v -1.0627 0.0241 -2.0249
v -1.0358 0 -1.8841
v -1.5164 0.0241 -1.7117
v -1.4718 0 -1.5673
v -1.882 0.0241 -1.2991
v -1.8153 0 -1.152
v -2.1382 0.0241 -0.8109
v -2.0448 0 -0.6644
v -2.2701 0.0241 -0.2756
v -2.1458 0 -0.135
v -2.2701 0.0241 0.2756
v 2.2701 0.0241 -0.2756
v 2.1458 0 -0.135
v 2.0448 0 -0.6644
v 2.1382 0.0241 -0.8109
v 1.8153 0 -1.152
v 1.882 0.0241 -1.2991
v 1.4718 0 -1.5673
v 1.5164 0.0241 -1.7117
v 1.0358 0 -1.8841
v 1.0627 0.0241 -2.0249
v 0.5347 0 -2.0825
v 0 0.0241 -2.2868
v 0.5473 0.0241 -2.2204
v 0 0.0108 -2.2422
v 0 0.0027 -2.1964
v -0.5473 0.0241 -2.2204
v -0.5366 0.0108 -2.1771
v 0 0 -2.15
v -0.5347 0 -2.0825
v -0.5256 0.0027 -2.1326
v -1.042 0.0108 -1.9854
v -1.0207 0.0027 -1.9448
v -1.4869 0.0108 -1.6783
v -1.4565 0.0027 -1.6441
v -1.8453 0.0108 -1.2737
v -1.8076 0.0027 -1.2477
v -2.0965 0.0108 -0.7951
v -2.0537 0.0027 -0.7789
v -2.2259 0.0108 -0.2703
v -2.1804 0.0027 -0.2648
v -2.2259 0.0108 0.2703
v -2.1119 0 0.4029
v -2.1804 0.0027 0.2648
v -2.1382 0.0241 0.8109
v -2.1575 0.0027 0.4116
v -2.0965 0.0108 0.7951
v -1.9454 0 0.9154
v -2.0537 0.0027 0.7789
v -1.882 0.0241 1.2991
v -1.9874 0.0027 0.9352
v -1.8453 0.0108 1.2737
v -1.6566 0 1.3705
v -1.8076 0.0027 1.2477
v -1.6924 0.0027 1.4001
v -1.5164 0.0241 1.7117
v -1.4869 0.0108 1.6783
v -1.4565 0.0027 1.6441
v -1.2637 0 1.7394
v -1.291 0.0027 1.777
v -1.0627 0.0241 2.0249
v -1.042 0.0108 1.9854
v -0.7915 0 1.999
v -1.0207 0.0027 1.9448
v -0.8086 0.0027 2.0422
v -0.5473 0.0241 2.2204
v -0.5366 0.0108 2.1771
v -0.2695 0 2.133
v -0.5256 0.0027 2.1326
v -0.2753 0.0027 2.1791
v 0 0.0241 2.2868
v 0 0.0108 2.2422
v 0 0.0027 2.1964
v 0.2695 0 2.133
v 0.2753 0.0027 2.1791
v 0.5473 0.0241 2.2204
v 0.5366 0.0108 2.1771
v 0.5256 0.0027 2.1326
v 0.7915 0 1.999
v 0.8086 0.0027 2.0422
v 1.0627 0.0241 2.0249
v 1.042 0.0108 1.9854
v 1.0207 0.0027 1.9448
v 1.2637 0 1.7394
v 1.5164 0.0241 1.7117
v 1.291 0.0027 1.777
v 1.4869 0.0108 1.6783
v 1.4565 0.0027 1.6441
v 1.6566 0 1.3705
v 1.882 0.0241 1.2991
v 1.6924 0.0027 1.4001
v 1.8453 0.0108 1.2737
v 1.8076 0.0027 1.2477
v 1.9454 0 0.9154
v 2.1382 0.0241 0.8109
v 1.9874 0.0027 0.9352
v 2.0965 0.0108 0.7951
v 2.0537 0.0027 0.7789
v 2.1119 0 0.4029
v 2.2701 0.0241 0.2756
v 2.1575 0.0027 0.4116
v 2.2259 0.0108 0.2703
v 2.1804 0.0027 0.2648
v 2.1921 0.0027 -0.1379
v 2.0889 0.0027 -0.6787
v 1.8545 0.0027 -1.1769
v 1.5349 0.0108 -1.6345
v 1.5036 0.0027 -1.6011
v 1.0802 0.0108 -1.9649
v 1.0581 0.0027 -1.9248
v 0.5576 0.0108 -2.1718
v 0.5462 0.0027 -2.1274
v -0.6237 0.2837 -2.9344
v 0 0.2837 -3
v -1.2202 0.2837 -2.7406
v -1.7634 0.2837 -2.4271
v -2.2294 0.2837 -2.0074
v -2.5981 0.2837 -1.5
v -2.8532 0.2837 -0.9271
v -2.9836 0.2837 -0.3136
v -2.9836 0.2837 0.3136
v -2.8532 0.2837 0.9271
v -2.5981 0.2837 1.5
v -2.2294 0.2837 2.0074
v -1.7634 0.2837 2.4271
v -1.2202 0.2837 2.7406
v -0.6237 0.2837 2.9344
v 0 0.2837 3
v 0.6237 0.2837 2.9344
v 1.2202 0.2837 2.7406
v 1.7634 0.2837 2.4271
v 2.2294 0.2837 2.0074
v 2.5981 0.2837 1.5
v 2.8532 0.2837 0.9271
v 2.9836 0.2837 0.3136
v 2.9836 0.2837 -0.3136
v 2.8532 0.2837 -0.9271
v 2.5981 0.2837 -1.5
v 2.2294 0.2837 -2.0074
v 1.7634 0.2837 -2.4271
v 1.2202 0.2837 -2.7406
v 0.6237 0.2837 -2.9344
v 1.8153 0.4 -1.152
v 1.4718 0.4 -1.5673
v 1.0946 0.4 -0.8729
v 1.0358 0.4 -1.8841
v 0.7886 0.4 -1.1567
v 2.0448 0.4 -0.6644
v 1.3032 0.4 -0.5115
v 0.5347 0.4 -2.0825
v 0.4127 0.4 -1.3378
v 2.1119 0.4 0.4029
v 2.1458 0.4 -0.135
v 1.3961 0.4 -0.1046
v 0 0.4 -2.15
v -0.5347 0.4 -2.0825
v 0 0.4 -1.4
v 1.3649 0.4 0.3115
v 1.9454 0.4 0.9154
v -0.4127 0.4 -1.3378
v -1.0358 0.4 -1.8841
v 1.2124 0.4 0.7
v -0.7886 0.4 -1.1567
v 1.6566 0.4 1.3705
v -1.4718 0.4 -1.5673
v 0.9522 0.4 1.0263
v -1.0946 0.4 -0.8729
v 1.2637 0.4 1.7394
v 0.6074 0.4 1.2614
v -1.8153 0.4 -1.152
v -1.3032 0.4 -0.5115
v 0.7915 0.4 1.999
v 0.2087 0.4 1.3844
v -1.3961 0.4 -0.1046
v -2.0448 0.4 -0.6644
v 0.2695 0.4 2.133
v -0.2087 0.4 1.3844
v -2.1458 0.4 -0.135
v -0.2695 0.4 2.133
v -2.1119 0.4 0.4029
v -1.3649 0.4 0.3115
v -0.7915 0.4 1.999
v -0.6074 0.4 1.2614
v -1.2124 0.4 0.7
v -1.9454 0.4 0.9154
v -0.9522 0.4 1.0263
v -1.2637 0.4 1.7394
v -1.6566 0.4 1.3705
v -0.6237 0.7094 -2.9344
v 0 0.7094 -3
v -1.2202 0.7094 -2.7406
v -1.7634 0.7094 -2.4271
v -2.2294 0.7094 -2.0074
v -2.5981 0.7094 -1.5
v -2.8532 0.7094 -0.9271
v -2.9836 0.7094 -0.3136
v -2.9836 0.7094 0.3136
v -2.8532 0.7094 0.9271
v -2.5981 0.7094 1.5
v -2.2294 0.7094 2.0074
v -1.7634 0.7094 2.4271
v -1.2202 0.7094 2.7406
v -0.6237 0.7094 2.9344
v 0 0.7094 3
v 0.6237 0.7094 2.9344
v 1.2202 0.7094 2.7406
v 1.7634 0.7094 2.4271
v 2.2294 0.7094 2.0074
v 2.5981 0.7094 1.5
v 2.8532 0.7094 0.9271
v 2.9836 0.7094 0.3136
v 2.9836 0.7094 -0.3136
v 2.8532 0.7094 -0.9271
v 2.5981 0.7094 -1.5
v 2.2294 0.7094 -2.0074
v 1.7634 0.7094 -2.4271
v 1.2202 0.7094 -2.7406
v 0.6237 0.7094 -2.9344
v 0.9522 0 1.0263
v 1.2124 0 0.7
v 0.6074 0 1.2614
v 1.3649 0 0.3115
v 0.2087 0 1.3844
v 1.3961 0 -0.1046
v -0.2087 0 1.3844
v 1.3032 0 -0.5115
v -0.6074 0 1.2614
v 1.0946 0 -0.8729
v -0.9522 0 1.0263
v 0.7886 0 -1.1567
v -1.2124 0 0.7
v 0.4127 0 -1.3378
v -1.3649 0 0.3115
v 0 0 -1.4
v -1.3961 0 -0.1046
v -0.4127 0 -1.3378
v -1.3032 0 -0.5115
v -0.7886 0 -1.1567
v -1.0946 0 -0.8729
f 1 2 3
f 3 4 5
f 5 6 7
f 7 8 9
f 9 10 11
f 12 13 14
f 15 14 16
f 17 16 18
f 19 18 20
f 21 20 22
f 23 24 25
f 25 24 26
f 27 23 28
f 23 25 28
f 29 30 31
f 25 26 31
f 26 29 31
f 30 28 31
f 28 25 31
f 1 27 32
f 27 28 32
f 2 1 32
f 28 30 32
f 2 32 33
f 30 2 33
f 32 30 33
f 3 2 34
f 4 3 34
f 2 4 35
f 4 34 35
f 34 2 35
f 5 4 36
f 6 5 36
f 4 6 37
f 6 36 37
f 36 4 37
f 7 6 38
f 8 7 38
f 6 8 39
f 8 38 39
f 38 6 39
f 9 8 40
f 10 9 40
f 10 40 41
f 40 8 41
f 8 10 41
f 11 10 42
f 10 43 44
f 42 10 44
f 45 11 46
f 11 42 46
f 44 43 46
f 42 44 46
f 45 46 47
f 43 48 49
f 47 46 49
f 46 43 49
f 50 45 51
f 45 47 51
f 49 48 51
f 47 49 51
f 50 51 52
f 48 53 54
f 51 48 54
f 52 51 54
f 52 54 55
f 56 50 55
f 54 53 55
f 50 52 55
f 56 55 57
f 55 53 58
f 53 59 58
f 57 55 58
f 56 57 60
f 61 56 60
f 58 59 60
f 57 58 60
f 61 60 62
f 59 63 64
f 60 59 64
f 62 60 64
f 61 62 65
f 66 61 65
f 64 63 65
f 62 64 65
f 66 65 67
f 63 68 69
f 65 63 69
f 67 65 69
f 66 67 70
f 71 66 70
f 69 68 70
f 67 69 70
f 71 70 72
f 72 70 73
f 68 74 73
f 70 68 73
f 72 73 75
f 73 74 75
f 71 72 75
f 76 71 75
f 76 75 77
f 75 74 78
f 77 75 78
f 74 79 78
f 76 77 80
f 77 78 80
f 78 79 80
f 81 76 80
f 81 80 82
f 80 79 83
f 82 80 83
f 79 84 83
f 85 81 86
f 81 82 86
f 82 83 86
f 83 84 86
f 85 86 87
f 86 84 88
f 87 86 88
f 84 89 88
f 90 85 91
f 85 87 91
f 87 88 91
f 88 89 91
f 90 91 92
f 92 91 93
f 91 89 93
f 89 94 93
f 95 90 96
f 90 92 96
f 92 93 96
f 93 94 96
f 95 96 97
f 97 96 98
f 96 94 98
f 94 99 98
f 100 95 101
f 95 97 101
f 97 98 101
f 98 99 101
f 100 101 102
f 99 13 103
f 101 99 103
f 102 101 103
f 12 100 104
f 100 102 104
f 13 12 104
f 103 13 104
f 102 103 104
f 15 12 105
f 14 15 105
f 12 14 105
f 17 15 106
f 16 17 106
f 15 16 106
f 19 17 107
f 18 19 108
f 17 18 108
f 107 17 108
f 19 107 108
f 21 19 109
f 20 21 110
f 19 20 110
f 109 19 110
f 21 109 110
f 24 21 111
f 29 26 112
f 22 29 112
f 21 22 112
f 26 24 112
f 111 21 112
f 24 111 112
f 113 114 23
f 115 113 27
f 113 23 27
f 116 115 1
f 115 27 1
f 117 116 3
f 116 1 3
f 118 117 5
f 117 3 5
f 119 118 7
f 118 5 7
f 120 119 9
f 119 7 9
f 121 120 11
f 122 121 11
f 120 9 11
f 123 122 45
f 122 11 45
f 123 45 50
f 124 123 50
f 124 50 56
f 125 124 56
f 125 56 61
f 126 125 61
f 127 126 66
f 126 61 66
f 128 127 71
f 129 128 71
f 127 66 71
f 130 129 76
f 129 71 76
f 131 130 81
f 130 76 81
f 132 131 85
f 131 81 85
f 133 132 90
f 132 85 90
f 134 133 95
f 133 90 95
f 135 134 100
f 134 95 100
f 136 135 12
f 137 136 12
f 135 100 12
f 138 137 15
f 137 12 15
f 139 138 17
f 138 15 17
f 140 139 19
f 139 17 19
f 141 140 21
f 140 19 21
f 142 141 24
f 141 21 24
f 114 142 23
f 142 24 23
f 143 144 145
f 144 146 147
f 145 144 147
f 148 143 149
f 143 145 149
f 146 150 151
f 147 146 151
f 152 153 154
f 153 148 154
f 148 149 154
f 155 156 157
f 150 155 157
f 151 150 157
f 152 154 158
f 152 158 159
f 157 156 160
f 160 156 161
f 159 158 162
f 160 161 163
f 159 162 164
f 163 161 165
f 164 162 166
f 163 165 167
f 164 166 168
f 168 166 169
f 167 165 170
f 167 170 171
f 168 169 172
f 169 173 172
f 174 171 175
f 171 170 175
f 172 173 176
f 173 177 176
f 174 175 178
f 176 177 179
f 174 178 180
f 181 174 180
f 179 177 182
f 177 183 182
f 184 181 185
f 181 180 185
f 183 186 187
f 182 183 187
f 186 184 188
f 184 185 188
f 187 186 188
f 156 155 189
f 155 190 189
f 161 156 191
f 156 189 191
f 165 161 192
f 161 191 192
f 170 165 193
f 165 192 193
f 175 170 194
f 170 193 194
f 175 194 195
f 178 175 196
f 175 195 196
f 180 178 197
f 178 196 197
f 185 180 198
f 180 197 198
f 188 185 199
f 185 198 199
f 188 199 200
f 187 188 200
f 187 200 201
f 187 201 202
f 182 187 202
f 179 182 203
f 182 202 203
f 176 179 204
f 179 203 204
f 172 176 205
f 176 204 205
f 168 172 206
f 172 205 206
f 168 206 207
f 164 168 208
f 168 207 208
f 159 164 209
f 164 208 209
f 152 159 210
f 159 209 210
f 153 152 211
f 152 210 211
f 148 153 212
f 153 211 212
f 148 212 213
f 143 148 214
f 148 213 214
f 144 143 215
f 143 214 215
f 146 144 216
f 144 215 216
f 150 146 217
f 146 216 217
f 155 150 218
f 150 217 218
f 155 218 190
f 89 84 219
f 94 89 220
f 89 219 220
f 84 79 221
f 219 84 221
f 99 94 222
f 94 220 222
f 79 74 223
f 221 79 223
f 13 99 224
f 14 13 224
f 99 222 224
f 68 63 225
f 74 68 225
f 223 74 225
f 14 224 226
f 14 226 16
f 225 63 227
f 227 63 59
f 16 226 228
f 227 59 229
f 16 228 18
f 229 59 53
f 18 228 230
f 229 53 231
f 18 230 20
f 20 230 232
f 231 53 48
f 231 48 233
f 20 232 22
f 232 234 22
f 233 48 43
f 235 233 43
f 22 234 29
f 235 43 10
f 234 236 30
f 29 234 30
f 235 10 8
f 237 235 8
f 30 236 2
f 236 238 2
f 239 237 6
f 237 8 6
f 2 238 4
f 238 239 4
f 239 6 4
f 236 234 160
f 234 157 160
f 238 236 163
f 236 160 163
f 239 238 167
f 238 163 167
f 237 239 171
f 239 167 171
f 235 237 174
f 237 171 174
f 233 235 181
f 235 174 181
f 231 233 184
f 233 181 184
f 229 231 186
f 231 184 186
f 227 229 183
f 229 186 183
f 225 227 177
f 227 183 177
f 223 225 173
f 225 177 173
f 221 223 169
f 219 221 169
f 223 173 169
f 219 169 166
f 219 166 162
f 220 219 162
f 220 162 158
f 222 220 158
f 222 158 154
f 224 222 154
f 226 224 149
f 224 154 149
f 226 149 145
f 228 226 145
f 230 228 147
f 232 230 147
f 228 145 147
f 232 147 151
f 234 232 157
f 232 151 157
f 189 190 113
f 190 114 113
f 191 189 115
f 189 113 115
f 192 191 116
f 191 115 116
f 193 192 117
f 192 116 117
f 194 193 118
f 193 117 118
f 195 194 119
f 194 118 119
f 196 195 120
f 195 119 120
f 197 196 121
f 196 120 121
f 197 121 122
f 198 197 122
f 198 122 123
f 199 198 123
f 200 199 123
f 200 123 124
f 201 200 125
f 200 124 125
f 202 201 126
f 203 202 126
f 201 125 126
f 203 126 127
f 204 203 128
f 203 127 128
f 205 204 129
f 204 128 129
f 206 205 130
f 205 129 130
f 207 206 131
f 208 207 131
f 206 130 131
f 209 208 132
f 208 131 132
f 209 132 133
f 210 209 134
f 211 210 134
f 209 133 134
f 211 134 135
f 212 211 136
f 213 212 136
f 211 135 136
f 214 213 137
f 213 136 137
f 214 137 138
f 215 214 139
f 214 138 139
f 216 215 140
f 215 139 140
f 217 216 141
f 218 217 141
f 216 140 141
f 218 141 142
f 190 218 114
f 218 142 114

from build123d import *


with BuildPart() as part:
    # Sketch1 → Revolve1 (revolve)
    with BuildSketch(Plane.XY, mode=Mode.PRIVATE) as revolve1_sk:
        with BuildLine():
            Line((2.15, 0.4), (3, 0.709374699))
            Line((3, 0.709374699), (3, 0.28370359))
            Line((3, 0.28370359), (2.286808057, 0.024122952))
            ThreePointArc((2.286808057, 0.024122952), (2.219459271, 0.006076899), (2.15, 0))
            Line((2.15, 0), (1.4, 0))
            Line((1.4, 0), (1.4, 0.4))
            Line((1.4, 0.4), (2.15, 0.4))
        make_face()
    revolve(revolve1_sk.sketch.rotate(Axis((0, 0, 0), (0, 1, 0)), 90), axis=Axis((0, 0, 0), (0, 1, 0)))  # turned: the seam where the file's is


solid = part.part
